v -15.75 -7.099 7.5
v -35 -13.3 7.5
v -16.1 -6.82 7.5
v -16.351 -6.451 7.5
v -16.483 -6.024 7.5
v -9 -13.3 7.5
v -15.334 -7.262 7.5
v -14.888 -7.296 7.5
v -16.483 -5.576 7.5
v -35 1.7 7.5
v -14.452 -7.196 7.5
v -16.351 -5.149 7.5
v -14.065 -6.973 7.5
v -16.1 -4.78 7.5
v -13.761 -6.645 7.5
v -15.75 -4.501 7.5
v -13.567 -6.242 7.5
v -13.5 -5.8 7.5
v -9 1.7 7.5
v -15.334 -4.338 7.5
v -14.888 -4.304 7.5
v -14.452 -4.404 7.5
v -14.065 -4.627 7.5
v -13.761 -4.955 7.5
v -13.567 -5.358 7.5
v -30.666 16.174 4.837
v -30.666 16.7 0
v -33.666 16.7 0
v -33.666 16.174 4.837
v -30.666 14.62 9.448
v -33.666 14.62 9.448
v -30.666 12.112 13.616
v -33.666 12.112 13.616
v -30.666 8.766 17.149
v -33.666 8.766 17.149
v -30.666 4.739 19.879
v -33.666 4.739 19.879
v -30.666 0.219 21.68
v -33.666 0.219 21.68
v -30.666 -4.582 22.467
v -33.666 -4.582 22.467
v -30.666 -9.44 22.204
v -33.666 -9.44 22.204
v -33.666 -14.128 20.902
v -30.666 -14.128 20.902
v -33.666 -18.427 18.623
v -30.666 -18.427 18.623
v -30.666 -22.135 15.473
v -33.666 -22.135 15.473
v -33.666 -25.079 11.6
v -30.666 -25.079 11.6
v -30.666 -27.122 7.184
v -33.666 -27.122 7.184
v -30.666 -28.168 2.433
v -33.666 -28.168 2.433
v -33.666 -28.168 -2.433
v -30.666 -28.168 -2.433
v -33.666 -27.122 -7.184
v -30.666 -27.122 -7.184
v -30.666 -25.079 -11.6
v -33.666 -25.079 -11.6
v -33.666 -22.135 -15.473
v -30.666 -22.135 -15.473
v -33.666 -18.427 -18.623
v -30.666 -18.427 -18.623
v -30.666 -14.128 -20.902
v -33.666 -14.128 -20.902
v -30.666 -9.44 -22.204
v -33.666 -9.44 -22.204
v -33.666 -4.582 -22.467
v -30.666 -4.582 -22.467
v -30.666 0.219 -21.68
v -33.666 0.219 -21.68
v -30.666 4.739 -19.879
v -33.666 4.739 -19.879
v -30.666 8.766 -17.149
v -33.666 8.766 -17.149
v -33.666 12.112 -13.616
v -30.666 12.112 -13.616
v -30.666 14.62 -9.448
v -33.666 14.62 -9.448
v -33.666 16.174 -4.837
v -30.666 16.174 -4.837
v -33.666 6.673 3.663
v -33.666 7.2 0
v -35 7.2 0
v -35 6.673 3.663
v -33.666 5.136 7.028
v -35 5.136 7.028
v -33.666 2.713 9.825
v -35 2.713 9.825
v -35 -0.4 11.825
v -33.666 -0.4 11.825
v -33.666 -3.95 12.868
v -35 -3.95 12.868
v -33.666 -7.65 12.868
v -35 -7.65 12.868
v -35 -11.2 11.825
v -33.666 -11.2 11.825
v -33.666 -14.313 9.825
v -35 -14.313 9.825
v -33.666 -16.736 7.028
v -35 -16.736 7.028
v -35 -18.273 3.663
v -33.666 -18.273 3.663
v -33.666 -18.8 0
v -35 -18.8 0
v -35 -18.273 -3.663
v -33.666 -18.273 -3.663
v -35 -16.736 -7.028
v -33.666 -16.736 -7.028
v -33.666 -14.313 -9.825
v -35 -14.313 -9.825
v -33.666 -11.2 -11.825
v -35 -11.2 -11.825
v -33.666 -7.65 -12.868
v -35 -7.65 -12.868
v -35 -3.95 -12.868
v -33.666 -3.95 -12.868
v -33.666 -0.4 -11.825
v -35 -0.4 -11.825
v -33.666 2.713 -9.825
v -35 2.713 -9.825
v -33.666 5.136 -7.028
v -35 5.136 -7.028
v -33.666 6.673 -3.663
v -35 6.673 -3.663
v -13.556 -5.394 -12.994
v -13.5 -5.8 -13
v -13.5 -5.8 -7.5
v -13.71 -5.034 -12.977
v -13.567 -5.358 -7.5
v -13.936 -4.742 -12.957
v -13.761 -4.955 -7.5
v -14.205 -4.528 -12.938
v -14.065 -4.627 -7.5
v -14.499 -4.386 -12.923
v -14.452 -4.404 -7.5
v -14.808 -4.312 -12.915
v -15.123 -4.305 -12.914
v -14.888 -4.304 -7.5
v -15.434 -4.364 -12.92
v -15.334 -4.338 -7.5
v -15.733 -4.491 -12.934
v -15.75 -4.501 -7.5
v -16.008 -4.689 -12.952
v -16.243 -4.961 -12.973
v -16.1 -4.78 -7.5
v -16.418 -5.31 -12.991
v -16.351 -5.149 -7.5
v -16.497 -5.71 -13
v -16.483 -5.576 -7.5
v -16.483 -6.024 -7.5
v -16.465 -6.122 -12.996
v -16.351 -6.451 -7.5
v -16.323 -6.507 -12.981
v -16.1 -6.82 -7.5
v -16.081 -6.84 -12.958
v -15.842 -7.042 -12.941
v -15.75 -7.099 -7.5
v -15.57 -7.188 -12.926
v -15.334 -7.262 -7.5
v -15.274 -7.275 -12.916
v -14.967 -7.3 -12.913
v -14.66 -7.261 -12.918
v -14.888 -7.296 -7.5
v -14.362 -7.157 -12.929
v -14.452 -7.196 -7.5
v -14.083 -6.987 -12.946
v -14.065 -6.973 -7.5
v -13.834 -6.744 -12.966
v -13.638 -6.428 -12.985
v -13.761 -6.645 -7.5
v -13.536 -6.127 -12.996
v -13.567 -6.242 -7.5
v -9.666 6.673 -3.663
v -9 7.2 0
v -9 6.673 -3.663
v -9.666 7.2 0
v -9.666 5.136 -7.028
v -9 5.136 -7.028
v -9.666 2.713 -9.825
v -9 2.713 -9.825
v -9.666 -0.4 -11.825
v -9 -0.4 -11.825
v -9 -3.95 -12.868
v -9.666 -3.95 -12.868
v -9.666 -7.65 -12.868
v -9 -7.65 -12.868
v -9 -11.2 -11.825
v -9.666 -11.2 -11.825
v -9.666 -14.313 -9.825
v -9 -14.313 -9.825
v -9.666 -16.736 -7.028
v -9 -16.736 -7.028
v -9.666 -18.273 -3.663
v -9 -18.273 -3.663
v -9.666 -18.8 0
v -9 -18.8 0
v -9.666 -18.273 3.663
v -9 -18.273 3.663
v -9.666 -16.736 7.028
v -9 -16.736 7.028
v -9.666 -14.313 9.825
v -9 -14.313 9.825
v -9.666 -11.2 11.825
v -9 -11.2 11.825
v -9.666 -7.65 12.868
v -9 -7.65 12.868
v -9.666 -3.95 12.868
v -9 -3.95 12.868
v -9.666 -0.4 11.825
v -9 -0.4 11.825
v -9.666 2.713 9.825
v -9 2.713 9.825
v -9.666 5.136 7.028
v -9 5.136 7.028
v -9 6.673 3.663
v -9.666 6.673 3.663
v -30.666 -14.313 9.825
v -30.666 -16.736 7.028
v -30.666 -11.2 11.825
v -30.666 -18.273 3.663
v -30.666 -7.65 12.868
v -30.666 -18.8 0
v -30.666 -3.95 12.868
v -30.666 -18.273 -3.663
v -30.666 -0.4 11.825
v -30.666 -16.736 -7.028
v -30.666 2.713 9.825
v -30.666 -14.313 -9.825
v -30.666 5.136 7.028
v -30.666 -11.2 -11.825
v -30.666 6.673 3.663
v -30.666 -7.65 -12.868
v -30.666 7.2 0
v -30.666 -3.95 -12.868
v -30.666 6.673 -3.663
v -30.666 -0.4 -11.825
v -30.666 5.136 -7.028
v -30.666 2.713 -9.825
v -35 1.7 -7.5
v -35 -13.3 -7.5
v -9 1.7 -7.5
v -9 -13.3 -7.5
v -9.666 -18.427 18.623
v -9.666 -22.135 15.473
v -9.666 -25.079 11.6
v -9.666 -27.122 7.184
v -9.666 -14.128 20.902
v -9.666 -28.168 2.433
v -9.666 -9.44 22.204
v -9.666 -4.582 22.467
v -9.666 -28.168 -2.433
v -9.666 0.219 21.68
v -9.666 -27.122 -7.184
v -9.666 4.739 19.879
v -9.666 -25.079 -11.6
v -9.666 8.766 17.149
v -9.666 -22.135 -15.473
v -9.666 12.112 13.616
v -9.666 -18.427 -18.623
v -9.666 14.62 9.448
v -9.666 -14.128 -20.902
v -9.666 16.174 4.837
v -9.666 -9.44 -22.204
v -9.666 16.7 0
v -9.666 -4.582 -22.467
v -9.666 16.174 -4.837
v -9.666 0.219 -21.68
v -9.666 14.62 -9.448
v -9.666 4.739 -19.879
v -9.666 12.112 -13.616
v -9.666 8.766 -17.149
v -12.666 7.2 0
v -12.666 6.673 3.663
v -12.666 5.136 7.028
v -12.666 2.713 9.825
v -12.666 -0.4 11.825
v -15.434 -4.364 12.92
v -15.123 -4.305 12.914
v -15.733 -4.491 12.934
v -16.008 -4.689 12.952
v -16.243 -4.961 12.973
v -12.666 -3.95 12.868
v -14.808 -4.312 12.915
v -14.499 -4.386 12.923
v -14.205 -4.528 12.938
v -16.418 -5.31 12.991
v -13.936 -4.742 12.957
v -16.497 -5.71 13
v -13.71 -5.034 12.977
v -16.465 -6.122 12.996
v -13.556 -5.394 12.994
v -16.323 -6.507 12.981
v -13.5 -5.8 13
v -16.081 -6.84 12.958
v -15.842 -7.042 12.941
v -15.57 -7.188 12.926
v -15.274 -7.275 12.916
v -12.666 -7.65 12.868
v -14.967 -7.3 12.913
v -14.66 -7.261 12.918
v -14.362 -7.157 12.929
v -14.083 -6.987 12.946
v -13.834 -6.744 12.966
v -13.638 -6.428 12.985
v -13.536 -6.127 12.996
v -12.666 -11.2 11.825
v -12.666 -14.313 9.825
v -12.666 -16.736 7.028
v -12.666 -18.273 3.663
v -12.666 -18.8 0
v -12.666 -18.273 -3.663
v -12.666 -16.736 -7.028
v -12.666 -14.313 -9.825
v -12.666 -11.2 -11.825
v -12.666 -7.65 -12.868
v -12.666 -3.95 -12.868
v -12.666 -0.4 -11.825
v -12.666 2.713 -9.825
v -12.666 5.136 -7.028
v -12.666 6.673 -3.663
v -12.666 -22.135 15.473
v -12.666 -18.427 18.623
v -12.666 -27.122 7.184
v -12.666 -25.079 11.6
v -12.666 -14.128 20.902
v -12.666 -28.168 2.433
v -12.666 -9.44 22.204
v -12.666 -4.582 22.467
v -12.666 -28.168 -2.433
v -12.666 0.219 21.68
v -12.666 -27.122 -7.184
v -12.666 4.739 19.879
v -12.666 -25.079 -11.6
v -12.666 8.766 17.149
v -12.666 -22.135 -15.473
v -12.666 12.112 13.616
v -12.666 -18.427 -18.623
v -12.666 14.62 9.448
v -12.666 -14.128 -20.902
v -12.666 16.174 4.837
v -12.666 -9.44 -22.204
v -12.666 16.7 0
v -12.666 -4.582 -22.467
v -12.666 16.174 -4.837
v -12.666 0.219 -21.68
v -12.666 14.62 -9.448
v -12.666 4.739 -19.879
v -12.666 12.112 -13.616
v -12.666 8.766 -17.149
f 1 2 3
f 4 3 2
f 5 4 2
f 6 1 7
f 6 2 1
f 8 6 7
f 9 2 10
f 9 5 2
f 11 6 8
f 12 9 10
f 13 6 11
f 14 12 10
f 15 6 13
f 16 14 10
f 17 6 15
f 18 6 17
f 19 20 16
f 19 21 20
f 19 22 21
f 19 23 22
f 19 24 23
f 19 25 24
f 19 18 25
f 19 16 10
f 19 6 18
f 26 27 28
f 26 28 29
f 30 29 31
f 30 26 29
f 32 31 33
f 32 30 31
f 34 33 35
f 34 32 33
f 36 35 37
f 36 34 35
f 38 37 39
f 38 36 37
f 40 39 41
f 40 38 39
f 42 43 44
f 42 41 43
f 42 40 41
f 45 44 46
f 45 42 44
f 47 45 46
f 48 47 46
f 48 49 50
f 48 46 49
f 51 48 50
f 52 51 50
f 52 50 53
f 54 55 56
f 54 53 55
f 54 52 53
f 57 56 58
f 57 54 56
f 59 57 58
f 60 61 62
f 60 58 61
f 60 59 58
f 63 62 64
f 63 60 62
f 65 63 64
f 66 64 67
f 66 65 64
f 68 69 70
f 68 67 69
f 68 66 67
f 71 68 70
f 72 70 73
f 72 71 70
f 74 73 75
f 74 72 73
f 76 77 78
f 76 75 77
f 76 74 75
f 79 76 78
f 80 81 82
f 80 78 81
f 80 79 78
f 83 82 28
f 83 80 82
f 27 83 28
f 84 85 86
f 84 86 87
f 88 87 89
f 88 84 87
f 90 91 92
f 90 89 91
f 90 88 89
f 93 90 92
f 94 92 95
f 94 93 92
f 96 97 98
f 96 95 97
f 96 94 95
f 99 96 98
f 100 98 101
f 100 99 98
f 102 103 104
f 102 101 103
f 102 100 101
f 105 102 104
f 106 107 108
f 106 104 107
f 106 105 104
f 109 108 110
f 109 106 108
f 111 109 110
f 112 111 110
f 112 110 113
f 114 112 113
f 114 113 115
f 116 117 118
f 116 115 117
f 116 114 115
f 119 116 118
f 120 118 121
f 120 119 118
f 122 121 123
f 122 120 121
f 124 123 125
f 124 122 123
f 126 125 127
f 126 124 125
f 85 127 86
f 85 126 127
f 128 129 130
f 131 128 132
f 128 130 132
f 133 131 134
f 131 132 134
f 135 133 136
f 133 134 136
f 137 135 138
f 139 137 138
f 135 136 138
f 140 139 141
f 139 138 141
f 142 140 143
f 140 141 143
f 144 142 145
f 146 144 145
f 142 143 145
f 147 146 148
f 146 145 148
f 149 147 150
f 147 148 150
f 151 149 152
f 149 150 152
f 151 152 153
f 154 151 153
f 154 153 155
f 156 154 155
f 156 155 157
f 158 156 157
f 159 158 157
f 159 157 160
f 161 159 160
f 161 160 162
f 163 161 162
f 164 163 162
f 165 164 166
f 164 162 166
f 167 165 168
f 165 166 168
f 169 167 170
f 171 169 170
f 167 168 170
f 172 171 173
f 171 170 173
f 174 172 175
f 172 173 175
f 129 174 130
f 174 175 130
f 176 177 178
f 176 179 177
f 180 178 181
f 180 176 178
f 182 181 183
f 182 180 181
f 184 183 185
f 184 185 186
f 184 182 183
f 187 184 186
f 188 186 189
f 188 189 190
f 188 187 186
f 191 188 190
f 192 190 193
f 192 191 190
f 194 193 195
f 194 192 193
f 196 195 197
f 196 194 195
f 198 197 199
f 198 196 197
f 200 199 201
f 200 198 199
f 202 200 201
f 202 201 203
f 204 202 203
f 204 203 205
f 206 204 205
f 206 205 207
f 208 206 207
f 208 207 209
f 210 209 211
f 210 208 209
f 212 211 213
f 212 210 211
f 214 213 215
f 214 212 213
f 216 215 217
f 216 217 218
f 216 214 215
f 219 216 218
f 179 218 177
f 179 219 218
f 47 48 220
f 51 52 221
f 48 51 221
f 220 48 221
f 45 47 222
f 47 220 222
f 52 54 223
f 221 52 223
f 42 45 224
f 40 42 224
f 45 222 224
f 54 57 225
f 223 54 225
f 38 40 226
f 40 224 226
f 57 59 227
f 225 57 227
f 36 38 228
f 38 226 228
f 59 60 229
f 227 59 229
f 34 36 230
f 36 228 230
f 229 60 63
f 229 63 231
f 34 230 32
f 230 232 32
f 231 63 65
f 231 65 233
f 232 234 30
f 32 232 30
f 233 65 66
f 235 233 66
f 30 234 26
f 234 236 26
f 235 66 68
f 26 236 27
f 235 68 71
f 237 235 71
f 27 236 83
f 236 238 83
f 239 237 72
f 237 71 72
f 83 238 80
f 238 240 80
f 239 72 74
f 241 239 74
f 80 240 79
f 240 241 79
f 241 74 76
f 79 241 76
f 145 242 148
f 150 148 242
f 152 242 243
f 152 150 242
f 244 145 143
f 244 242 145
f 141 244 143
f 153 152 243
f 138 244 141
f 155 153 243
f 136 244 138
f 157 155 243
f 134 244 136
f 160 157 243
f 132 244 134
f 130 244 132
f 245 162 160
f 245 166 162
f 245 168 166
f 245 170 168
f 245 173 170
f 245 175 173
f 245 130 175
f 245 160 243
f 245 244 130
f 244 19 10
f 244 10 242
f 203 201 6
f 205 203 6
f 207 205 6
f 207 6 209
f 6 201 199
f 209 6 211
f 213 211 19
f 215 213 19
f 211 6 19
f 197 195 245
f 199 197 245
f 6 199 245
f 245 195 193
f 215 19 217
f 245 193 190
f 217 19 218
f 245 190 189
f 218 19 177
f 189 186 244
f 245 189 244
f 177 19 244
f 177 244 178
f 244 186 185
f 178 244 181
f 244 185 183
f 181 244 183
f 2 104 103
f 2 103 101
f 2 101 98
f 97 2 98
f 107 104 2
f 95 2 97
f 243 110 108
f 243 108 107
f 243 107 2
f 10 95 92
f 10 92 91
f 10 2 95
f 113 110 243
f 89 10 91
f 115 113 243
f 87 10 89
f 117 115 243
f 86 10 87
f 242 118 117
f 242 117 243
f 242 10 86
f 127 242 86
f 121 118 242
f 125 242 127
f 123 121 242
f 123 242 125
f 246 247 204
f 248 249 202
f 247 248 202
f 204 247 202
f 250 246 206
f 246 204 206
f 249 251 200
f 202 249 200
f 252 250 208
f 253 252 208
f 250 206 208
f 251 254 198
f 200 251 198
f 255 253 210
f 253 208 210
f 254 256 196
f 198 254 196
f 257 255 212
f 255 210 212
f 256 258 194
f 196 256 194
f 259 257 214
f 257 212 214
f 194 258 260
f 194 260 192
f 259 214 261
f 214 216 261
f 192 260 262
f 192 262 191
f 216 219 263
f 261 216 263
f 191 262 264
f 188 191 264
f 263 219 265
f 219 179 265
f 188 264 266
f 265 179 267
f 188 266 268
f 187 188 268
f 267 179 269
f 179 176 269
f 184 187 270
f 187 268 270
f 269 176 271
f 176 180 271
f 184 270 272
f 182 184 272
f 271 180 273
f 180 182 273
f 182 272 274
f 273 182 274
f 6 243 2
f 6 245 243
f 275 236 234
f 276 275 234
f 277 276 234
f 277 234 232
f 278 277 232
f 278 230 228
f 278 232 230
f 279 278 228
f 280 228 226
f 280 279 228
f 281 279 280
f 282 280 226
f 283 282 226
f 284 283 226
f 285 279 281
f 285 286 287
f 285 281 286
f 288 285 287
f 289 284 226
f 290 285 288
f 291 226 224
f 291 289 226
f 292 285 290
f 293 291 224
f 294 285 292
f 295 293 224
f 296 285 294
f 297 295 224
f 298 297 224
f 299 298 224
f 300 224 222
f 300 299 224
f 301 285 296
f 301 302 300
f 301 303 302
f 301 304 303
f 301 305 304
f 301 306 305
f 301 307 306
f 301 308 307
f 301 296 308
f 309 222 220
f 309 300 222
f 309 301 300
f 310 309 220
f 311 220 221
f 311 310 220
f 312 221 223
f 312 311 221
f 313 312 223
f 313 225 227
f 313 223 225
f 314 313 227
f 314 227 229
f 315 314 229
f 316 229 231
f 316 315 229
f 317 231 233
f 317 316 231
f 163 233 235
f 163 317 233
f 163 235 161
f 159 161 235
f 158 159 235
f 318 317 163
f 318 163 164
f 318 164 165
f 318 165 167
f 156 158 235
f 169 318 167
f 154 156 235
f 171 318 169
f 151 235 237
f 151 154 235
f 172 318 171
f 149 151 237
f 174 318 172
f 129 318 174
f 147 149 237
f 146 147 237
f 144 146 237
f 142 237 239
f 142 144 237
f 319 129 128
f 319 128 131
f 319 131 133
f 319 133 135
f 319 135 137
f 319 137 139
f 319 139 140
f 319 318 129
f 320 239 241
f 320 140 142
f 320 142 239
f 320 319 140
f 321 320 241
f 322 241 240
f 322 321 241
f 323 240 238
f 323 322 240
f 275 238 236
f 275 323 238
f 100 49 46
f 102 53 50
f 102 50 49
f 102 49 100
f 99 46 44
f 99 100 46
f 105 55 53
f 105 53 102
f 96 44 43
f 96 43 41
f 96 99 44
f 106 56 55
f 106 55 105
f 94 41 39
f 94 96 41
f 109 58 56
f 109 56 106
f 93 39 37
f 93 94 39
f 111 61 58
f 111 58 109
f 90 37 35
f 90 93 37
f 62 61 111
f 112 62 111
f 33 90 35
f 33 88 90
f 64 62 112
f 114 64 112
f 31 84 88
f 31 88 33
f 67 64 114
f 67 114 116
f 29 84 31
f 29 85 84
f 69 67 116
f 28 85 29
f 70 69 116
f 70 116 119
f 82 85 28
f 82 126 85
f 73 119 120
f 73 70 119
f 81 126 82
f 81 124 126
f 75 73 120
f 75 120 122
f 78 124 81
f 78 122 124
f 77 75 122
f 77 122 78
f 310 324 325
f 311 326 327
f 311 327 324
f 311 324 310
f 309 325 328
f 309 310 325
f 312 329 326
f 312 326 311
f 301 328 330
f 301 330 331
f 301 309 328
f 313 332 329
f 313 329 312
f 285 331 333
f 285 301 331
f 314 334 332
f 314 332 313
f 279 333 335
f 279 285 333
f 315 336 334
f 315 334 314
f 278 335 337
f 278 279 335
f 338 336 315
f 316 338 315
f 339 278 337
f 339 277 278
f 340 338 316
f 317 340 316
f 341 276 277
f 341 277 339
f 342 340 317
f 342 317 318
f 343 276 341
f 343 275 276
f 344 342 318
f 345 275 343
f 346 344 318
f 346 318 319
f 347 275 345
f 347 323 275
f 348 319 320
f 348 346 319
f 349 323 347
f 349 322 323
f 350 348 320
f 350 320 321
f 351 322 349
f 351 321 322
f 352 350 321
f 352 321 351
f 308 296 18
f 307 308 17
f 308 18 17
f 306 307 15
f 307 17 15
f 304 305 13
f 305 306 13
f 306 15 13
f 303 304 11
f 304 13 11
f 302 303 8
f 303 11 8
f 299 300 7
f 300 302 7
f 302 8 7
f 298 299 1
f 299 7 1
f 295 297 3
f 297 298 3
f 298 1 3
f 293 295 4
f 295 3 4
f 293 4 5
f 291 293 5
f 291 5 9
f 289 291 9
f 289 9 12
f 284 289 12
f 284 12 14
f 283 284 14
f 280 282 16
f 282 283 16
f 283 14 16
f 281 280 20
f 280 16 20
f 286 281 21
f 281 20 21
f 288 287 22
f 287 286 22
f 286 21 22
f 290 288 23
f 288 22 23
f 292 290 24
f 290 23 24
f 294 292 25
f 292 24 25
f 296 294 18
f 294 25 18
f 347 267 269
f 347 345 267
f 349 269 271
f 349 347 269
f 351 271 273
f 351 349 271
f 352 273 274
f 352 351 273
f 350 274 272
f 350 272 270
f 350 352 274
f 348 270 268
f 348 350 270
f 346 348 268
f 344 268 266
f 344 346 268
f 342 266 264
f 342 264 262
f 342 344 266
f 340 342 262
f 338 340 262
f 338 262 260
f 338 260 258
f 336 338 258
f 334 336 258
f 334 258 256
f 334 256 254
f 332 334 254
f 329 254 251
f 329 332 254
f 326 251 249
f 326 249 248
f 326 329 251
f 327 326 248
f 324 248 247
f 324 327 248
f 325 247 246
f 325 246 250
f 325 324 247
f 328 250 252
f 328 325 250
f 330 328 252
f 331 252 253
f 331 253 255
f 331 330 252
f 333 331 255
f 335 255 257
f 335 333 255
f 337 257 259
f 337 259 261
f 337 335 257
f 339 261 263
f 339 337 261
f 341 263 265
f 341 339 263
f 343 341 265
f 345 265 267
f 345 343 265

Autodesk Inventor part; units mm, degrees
ref_plane "YZ Plane" through (0, 0, 0) normal (1, 0, 0) x (0, 1, 0)
ref_plane "XZ Plane" through (0, 0, 0) normal (0, 1, 0) x (-1, 0, 0)
ref_plane "XY Plane" through (0, 0, 0) normal (0, 0, 1) x (1, 0, 0)
sketch "Sketch1" plane through (0, 0, 0) normal (0, 0, 1) x (1, 0, 0)
  line L0 (-9, 0) -> (-9, 7.2)
  line L1 (-9, 7.2) -> (-9.6665, 7.2)
  line L2 (-9.6665, 7.2) -> (-9.6665, 16.7)
  line L3 (-9.6665, 16.7) -> (-12.6665, 16.7)
  line L4 (-12.6665, 16.7) -> (-12.6665, 9.4)
  line L5 (-35, 0) -> (-35, 7.2)
  line L6 (-35, 7.2) -> (-33.6665, 7.2)
  line L7 (-33.6665, 7.2) -> (-33.6665, 16.7)
  line L8 (-33.6665, 16.7) -> (-30.6665, 16.7)
  line L9 (-30.6665, 16.7) -> (-30.6665, 7.2)
  line L10 (-41.0656, -5.8) -> (-47.8962, -5.8)
  line L11 (-12.6665, 9.4) -> (-12.6665, 7.2)
  line L12 (-30.6665, 7.2) -> (-12.6665, 7.2)
  line L13 (-35, 0) -> (-35, -5.8)
  line L14 (-9, 0) -> (-9, -5.8)
  line L15 (-9, -5.8) -> (-35, -5.8)
  circle A0 centre (-15, -5.8) radius 1.5
  point P0 (0, 0)
  point P1 (-16.5, -5.8)
  point P2 (-13.5, -5.8)
  dimension "d5" = 3
  dimension "d6" = 45
  dimension "d7" = 26
  dimension "d9" = 3
  dimension "d11" = 18
  dimension "d12" = 26
revolve "Revolution1" add sketch "Sketch1" angle 360 about axis through (-41.0656, -5.8, 0) along (-1, 0, 0) contours L14 L15 A0 L13 L5 L6 L7 L8 L9 L12 L11 L4 L3 L2 L1 L0
sketch "Sketch2" plane through (-9, -5.8, 0) normal (1, 0, 0) x (0, 0, -1)
  line L0 (7.5, -7.5) -> (-7.5, -7.5)
  line L1 (-7.5, -7.5) -> (-7.5, 7.5)
  line L2 (-7.5, 7.5) -> (7.5, 7.5)
  line L3 (7.5, 7.5) -> (7.5, -7.5)
  line L4 (7.5, -7.5) -> (-7.5, 7.5) construction
  line L5 (-7.5, -7.5) -> (7.5, 7.5) construction
  point P0 (0, 5.8)
  point P1 (0, 0)
  dimension "d14" = 15
  dimension "d15" = 15
extrude "Extrusion1" cut sketch "Sketch2" against normal blind 100
extrude "Extrusion2" cut sketch "Sketch1" along normal mid plane 100 contours A0 L15 | L15 A0
